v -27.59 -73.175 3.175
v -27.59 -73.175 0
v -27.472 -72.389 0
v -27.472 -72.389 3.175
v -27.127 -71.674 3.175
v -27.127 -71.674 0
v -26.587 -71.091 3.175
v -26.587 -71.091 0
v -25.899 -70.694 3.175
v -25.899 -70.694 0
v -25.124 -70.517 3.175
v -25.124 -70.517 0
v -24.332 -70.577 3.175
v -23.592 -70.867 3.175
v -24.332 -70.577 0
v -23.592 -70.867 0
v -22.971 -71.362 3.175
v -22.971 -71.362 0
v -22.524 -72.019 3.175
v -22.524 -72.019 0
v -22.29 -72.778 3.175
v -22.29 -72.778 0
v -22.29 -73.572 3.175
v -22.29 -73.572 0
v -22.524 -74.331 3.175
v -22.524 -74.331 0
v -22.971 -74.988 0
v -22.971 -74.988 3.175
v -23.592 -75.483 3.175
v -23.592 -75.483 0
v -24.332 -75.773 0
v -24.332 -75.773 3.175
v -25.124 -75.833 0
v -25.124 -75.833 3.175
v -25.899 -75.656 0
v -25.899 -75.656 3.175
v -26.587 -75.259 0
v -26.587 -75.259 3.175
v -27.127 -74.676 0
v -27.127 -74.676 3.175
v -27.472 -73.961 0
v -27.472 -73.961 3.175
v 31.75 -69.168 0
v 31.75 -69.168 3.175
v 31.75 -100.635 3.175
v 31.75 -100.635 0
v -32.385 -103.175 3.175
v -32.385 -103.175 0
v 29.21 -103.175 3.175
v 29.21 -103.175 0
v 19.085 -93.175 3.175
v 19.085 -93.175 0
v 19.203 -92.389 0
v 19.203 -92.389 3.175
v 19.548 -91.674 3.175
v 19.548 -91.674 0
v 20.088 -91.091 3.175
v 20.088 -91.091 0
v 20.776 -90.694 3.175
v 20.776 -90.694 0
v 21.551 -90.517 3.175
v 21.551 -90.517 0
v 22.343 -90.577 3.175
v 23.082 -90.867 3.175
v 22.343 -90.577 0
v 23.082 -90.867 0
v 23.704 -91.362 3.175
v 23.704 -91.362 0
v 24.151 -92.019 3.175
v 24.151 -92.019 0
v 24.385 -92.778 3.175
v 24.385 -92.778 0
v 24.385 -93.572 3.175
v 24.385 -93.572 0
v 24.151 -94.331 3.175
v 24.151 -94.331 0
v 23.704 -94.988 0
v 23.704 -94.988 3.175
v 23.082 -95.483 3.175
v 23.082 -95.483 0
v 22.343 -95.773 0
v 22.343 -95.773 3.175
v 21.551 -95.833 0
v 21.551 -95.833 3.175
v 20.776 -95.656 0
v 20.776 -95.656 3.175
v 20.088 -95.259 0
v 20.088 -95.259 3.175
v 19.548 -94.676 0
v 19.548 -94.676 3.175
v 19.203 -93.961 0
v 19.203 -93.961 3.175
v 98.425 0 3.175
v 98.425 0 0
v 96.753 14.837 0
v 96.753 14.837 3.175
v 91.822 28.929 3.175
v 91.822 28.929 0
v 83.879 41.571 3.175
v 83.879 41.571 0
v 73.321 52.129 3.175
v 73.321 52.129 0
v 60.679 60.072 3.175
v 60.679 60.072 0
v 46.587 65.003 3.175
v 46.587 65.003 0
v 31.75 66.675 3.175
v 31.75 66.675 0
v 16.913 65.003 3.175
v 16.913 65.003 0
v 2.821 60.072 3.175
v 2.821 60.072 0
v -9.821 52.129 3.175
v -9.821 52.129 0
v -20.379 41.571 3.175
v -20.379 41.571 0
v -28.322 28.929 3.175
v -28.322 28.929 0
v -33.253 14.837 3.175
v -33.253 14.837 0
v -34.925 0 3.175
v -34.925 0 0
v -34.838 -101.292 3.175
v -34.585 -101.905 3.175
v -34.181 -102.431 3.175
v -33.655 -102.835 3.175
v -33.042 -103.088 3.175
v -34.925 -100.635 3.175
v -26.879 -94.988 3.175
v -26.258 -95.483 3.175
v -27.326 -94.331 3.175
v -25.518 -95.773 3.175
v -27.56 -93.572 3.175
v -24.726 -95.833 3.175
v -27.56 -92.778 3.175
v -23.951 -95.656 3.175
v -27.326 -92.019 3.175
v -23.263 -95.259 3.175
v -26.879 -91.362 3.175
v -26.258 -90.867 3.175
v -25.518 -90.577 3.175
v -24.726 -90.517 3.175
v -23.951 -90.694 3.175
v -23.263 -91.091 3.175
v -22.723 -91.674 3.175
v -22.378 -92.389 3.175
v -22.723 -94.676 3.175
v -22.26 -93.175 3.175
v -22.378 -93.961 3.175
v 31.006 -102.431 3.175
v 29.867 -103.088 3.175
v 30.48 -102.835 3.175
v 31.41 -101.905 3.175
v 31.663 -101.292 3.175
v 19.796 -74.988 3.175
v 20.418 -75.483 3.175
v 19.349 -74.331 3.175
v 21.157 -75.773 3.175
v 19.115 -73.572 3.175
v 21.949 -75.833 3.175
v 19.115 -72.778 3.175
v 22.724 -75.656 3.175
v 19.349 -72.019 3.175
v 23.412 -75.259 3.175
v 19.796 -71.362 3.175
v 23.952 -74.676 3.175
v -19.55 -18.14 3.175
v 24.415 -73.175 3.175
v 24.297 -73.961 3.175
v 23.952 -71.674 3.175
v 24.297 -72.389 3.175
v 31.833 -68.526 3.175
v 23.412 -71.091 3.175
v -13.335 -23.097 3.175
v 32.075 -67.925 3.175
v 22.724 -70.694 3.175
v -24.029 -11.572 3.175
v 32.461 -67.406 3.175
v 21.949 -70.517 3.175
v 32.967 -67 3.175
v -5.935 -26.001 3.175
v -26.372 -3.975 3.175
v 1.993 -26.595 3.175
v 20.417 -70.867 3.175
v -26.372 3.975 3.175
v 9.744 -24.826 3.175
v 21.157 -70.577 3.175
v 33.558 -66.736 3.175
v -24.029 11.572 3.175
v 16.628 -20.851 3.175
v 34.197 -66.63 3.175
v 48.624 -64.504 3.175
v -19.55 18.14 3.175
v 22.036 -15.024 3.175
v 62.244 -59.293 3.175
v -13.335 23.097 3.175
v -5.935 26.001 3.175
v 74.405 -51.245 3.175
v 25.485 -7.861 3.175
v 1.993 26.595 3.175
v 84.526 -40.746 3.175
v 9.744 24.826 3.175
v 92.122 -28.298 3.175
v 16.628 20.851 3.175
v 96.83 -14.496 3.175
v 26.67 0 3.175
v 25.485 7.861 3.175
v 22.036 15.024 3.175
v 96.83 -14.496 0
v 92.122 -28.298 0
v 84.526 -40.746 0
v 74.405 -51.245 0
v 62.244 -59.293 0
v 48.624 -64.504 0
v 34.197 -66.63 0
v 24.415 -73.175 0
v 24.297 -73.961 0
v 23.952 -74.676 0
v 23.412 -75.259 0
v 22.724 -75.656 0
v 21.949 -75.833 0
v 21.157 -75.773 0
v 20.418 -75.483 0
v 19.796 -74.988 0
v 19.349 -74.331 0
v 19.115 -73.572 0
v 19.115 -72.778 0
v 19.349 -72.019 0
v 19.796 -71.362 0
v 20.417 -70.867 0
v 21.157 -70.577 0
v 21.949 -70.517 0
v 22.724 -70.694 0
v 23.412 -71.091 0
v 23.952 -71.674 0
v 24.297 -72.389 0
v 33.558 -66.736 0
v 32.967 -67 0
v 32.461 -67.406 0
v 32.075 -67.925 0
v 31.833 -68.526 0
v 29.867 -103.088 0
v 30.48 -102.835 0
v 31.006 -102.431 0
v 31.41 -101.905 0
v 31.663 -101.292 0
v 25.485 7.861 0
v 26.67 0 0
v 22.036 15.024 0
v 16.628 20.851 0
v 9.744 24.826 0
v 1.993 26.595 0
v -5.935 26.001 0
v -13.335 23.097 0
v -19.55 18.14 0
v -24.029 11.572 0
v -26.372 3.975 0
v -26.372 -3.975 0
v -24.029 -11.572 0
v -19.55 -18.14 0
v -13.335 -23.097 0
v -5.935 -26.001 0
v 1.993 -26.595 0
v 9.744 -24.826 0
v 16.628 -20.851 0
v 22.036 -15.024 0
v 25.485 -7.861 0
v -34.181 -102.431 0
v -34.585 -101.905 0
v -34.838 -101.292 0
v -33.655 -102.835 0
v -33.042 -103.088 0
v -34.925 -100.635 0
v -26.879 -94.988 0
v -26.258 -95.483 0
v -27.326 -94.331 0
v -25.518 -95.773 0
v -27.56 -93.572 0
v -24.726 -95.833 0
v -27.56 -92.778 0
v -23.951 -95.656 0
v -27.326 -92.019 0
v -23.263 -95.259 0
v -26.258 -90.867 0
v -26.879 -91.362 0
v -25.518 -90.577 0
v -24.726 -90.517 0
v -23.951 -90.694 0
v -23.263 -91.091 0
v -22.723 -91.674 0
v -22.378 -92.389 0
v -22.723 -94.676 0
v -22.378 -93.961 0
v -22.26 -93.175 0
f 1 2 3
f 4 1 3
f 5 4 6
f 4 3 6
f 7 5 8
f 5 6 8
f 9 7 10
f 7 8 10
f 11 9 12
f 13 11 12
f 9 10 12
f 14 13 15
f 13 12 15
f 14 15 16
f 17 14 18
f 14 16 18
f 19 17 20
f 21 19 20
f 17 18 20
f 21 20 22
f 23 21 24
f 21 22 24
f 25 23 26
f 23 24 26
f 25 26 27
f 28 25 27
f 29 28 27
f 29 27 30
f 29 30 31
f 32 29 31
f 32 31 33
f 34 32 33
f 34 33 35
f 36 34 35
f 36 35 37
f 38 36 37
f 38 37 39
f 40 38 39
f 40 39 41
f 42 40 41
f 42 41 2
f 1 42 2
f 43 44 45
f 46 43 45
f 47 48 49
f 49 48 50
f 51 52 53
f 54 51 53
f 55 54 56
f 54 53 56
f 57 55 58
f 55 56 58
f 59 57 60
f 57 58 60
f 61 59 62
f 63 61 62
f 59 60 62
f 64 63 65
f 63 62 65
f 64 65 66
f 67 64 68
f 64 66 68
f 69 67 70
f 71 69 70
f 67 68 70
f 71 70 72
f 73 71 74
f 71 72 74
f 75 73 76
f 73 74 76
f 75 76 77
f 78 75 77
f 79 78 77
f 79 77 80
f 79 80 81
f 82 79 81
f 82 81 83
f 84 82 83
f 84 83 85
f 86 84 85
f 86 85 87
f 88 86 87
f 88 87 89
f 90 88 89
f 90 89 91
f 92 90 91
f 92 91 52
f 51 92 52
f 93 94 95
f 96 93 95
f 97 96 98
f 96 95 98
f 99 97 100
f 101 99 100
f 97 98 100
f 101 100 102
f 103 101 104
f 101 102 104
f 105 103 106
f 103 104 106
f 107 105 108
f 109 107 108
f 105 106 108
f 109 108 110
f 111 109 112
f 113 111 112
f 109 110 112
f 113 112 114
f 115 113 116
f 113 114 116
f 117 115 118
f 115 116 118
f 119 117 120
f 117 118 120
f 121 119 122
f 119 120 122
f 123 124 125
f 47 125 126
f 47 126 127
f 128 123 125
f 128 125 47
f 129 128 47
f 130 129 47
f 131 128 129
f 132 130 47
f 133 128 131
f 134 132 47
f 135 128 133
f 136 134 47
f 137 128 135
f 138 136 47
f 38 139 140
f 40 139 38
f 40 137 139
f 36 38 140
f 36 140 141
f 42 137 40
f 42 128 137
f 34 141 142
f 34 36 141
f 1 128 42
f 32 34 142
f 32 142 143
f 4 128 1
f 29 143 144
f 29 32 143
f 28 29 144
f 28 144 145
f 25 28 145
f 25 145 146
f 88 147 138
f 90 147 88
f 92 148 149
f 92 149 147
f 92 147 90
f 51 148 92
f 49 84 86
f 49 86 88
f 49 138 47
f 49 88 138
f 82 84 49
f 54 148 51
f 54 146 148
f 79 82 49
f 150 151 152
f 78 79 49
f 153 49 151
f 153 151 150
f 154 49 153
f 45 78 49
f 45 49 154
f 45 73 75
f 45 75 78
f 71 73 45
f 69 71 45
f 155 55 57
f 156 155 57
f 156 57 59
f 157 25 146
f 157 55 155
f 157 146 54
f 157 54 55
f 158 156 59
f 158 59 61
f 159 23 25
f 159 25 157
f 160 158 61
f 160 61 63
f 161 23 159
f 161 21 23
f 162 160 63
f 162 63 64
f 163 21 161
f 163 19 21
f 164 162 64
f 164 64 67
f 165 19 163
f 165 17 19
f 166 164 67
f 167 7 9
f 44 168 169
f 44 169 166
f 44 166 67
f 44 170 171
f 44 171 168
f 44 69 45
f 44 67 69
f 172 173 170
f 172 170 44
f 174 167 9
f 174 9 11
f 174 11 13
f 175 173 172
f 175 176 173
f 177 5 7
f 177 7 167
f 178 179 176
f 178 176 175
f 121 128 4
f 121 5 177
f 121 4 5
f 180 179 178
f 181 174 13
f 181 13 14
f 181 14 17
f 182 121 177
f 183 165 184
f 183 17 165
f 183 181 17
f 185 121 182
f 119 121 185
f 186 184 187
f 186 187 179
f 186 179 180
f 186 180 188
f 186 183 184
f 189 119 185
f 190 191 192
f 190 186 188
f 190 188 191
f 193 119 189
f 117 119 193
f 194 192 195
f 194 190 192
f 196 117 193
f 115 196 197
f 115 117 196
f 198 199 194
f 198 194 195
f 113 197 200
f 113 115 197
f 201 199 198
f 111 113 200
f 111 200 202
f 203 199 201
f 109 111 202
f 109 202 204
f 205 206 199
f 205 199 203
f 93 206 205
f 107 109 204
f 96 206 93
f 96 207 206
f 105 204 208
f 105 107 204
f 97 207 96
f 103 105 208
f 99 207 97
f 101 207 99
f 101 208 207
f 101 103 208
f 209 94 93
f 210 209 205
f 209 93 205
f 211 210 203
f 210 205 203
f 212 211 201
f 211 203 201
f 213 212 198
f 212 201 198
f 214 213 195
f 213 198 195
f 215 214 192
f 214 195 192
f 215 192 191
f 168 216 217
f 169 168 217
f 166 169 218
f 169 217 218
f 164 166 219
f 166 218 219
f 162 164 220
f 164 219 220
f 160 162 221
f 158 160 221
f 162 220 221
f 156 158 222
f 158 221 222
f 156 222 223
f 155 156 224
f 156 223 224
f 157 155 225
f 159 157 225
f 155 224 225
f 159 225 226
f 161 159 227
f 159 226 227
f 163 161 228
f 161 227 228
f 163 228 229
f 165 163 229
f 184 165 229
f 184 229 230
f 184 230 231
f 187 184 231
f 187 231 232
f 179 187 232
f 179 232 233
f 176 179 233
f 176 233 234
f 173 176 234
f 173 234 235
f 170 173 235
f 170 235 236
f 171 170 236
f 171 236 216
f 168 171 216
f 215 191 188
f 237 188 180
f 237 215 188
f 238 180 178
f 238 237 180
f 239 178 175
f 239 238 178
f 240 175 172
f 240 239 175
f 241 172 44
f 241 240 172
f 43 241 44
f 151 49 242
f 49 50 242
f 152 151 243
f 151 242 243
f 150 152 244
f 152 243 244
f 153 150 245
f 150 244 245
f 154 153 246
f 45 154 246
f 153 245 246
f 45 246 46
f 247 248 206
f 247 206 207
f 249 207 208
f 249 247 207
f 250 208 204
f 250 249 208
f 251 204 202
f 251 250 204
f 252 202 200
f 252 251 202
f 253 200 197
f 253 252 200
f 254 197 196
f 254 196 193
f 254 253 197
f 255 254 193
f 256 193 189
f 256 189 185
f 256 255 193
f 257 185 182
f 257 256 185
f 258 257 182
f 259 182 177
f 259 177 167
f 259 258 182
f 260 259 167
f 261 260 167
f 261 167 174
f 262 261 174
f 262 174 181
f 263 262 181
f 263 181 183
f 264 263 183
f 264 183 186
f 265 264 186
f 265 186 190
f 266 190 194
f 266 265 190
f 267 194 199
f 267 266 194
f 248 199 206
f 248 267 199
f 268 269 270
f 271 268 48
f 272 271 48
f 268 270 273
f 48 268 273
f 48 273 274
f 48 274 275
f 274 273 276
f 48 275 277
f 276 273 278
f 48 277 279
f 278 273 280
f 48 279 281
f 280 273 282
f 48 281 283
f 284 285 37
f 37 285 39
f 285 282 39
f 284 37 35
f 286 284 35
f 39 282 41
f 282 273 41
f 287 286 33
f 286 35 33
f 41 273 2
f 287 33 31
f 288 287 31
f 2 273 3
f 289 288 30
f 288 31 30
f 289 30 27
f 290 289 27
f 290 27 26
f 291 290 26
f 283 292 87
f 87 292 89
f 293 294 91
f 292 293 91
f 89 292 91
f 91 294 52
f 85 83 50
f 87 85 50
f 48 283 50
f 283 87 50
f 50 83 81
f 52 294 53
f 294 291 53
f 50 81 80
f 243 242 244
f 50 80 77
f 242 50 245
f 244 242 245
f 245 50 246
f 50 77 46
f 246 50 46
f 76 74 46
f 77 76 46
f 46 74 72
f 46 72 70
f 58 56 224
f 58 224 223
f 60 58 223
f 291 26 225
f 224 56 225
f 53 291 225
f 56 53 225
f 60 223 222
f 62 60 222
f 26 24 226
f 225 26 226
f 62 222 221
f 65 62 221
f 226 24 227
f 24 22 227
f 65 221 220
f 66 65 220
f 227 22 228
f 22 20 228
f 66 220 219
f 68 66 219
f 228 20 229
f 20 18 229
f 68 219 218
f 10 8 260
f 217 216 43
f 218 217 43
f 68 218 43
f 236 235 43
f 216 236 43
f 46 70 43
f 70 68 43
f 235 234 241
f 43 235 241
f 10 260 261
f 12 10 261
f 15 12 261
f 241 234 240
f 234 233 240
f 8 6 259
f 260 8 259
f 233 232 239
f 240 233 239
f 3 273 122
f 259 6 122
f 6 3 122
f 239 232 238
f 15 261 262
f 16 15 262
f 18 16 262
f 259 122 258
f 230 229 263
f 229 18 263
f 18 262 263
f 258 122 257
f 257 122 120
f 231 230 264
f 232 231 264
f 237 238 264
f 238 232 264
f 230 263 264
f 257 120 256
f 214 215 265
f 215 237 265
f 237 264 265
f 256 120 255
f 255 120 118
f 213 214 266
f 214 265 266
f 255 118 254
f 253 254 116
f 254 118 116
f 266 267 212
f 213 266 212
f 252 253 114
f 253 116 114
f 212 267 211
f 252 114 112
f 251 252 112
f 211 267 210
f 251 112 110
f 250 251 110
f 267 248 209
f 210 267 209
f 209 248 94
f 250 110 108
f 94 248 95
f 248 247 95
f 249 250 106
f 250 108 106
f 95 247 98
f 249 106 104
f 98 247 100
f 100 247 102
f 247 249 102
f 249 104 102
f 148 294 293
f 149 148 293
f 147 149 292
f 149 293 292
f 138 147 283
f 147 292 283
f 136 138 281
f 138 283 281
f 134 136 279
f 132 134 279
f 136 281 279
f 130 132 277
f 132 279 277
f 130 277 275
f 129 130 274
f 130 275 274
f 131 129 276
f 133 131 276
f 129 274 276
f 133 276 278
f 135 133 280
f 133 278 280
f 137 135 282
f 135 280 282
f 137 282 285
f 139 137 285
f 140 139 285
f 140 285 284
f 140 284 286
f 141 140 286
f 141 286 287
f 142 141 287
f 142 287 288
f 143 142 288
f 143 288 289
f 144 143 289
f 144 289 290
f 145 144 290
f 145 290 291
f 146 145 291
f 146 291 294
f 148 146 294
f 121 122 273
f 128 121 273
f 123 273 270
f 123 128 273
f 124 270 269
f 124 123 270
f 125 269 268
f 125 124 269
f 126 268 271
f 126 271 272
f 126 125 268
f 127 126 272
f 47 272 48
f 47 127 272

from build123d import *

# Parameters (mm, degrees)
SKETCH1_R           = 26.67
BOSS_EXTRUDE1_DEPTH = 3.175
CUT_EXTRUDE1_REACH  = 144.628
CUT_EXTRUDE2_REACH  = 144.628
SKETCH3_R           = 2.665
FILLET1_R           = 2.54


with BuildPart() as part:
    # Sketch1 → Boss-Extrude1 (new body)
    with BuildSketch(Plane.XY):
        with BuildLine():
            Line((-34.925, 0), (-34.925, -63.5))
            Line((-34.925, -63.5), (-34.925, -103.175))
            Line((-34.925, -103.175), (98.425, -103.175))
            Line((98.425, -103.175), (98.425, -64.833888838))
            Line((98.425, -64.833888838), (98.425, 0))
            ThreePointArc((98.425, 0), (31.75, 66.675), (-34.925, 0))
        make_face()
        Circle(SKETCH1_R, mode=Mode.SUBTRACT)
    extrude(amount=BOSS_EXTRUDE1_DEPTH)

    # Sketch2 → Cut-Extrude1 (cut, up to next)
    with BuildSketch(Plane.XY.offset(3.175), mode=Mode.PRIVATE) as cut_extrude1_sk1:
        with BuildLine():
            Line((31.75, -66.675), (31.75, -103.175))
            Line((31.75, -103.175), (98.425, -103.175))
            Line((98.425, -103.175), (98.425, 0))
            ThreePointArc((98.425, 0), (78.896344636, -47.146344636), (31.75, -66.675))
        make_face()
    cut_extrude1_tool1 = extrude(cut_extrude1_sk1.sketch, amount=-CUT_EXTRUDE1_REACH, mode=Mode.PRIVATE) & part.part
    add(cut_extrude1_tool1.solids().sort_by_distance((70.281775, -75.59134, 3.175))[0], mode=Mode.SUBTRACT)

    # Sketch3 → Cut-Extrude2 (cut, up to next)
    with BuildSketch(Plane(origin=(0, 0, 0), x_dir=(-1, 0, 0), z_dir=(0, 0, -1)), mode=Mode.PRIVATE) as cut_extrude2_sk1:
        with Locations((-21.75, -93.175)):
            Circle(SKETCH3_R)
    cut_extrude2_tool1 = extrude(cut_extrude2_sk1.sketch, amount=-CUT_EXTRUDE2_REACH, mode=Mode.PRIVATE) & part.part
    # Sketch3 → Cut-Extrude2 (cut, up to next)
    with BuildSketch(Plane(origin=(0, 0, 0), x_dir=(-1, 0, 0), z_dir=(0, 0, -1)), mode=Mode.PRIVATE) as cut_extrude2_sk2:
        with Locations(Location((-21.75, -73.175, 0), (0, 0, 180))):
            Circle(SKETCH3_R)
    cut_extrude2_tool2 = extrude(cut_extrude2_sk2.sketch, amount=-CUT_EXTRUDE2_REACH, mode=Mode.PRIVATE) & part.part
    # Sketch3 → Cut-Extrude2 (cut, up to next)
    with BuildSketch(Plane(origin=(0, 0, 0), x_dir=(-1, 0, 0), z_dir=(0, 0, -1)), mode=Mode.PRIVATE) as cut_extrude2_sk3:
        with Locations(Location((24.925, -93.175, 0), (0, 0, 180))):
            Circle(SKETCH3_R)
    cut_extrude2_tool3 = extrude(cut_extrude2_sk3.sketch, amount=-CUT_EXTRUDE2_REACH, mode=Mode.PRIVATE) & part.part
    # Sketch3 → Cut-Extrude2 (cut, up to next)
    with BuildSketch(Plane(origin=(0, 0, 0), x_dir=(-1, 0, 0), z_dir=(0, 0, -1)), mode=Mode.PRIVATE) as cut_extrude2_sk4:
        with Locations((24.925, -73.175)):
            Circle(SKETCH3_R)
    cut_extrude2_tool4 = extrude(cut_extrude2_sk4.sketch, amount=-CUT_EXTRUDE2_REACH, mode=Mode.PRIVATE) & part.part
    add(cut_extrude2_tool1.solids().sort_by_distance((21.75, -93.175, 0))[0], mode=Mode.SUBTRACT)
    add(cut_extrude2_tool2.solids().sort_by_distance((21.75, -73.175, 0))[0], mode=Mode.SUBTRACT)
    add(cut_extrude2_tool3.solids().sort_by_distance((-24.925, -93.175, 0))[0], mode=Mode.SUBTRACT)
    add(cut_extrude2_tool4.solids().sort_by_distance((-24.925, -73.175, 0))[0], mode=Mode.SUBTRACT)

    # Fillet1
    fillet1_edges = [part.edges().sort_by_distance(p)[0] for p in [
        (-34.925, -103.175, 1.5875),
        (31.75, -66.675, 1.5875),
        (31.75, -103.175, 1.5875),
    ]]
    fillet(fillet1_edges, radius=FILLET1_R)


solid = part.part
